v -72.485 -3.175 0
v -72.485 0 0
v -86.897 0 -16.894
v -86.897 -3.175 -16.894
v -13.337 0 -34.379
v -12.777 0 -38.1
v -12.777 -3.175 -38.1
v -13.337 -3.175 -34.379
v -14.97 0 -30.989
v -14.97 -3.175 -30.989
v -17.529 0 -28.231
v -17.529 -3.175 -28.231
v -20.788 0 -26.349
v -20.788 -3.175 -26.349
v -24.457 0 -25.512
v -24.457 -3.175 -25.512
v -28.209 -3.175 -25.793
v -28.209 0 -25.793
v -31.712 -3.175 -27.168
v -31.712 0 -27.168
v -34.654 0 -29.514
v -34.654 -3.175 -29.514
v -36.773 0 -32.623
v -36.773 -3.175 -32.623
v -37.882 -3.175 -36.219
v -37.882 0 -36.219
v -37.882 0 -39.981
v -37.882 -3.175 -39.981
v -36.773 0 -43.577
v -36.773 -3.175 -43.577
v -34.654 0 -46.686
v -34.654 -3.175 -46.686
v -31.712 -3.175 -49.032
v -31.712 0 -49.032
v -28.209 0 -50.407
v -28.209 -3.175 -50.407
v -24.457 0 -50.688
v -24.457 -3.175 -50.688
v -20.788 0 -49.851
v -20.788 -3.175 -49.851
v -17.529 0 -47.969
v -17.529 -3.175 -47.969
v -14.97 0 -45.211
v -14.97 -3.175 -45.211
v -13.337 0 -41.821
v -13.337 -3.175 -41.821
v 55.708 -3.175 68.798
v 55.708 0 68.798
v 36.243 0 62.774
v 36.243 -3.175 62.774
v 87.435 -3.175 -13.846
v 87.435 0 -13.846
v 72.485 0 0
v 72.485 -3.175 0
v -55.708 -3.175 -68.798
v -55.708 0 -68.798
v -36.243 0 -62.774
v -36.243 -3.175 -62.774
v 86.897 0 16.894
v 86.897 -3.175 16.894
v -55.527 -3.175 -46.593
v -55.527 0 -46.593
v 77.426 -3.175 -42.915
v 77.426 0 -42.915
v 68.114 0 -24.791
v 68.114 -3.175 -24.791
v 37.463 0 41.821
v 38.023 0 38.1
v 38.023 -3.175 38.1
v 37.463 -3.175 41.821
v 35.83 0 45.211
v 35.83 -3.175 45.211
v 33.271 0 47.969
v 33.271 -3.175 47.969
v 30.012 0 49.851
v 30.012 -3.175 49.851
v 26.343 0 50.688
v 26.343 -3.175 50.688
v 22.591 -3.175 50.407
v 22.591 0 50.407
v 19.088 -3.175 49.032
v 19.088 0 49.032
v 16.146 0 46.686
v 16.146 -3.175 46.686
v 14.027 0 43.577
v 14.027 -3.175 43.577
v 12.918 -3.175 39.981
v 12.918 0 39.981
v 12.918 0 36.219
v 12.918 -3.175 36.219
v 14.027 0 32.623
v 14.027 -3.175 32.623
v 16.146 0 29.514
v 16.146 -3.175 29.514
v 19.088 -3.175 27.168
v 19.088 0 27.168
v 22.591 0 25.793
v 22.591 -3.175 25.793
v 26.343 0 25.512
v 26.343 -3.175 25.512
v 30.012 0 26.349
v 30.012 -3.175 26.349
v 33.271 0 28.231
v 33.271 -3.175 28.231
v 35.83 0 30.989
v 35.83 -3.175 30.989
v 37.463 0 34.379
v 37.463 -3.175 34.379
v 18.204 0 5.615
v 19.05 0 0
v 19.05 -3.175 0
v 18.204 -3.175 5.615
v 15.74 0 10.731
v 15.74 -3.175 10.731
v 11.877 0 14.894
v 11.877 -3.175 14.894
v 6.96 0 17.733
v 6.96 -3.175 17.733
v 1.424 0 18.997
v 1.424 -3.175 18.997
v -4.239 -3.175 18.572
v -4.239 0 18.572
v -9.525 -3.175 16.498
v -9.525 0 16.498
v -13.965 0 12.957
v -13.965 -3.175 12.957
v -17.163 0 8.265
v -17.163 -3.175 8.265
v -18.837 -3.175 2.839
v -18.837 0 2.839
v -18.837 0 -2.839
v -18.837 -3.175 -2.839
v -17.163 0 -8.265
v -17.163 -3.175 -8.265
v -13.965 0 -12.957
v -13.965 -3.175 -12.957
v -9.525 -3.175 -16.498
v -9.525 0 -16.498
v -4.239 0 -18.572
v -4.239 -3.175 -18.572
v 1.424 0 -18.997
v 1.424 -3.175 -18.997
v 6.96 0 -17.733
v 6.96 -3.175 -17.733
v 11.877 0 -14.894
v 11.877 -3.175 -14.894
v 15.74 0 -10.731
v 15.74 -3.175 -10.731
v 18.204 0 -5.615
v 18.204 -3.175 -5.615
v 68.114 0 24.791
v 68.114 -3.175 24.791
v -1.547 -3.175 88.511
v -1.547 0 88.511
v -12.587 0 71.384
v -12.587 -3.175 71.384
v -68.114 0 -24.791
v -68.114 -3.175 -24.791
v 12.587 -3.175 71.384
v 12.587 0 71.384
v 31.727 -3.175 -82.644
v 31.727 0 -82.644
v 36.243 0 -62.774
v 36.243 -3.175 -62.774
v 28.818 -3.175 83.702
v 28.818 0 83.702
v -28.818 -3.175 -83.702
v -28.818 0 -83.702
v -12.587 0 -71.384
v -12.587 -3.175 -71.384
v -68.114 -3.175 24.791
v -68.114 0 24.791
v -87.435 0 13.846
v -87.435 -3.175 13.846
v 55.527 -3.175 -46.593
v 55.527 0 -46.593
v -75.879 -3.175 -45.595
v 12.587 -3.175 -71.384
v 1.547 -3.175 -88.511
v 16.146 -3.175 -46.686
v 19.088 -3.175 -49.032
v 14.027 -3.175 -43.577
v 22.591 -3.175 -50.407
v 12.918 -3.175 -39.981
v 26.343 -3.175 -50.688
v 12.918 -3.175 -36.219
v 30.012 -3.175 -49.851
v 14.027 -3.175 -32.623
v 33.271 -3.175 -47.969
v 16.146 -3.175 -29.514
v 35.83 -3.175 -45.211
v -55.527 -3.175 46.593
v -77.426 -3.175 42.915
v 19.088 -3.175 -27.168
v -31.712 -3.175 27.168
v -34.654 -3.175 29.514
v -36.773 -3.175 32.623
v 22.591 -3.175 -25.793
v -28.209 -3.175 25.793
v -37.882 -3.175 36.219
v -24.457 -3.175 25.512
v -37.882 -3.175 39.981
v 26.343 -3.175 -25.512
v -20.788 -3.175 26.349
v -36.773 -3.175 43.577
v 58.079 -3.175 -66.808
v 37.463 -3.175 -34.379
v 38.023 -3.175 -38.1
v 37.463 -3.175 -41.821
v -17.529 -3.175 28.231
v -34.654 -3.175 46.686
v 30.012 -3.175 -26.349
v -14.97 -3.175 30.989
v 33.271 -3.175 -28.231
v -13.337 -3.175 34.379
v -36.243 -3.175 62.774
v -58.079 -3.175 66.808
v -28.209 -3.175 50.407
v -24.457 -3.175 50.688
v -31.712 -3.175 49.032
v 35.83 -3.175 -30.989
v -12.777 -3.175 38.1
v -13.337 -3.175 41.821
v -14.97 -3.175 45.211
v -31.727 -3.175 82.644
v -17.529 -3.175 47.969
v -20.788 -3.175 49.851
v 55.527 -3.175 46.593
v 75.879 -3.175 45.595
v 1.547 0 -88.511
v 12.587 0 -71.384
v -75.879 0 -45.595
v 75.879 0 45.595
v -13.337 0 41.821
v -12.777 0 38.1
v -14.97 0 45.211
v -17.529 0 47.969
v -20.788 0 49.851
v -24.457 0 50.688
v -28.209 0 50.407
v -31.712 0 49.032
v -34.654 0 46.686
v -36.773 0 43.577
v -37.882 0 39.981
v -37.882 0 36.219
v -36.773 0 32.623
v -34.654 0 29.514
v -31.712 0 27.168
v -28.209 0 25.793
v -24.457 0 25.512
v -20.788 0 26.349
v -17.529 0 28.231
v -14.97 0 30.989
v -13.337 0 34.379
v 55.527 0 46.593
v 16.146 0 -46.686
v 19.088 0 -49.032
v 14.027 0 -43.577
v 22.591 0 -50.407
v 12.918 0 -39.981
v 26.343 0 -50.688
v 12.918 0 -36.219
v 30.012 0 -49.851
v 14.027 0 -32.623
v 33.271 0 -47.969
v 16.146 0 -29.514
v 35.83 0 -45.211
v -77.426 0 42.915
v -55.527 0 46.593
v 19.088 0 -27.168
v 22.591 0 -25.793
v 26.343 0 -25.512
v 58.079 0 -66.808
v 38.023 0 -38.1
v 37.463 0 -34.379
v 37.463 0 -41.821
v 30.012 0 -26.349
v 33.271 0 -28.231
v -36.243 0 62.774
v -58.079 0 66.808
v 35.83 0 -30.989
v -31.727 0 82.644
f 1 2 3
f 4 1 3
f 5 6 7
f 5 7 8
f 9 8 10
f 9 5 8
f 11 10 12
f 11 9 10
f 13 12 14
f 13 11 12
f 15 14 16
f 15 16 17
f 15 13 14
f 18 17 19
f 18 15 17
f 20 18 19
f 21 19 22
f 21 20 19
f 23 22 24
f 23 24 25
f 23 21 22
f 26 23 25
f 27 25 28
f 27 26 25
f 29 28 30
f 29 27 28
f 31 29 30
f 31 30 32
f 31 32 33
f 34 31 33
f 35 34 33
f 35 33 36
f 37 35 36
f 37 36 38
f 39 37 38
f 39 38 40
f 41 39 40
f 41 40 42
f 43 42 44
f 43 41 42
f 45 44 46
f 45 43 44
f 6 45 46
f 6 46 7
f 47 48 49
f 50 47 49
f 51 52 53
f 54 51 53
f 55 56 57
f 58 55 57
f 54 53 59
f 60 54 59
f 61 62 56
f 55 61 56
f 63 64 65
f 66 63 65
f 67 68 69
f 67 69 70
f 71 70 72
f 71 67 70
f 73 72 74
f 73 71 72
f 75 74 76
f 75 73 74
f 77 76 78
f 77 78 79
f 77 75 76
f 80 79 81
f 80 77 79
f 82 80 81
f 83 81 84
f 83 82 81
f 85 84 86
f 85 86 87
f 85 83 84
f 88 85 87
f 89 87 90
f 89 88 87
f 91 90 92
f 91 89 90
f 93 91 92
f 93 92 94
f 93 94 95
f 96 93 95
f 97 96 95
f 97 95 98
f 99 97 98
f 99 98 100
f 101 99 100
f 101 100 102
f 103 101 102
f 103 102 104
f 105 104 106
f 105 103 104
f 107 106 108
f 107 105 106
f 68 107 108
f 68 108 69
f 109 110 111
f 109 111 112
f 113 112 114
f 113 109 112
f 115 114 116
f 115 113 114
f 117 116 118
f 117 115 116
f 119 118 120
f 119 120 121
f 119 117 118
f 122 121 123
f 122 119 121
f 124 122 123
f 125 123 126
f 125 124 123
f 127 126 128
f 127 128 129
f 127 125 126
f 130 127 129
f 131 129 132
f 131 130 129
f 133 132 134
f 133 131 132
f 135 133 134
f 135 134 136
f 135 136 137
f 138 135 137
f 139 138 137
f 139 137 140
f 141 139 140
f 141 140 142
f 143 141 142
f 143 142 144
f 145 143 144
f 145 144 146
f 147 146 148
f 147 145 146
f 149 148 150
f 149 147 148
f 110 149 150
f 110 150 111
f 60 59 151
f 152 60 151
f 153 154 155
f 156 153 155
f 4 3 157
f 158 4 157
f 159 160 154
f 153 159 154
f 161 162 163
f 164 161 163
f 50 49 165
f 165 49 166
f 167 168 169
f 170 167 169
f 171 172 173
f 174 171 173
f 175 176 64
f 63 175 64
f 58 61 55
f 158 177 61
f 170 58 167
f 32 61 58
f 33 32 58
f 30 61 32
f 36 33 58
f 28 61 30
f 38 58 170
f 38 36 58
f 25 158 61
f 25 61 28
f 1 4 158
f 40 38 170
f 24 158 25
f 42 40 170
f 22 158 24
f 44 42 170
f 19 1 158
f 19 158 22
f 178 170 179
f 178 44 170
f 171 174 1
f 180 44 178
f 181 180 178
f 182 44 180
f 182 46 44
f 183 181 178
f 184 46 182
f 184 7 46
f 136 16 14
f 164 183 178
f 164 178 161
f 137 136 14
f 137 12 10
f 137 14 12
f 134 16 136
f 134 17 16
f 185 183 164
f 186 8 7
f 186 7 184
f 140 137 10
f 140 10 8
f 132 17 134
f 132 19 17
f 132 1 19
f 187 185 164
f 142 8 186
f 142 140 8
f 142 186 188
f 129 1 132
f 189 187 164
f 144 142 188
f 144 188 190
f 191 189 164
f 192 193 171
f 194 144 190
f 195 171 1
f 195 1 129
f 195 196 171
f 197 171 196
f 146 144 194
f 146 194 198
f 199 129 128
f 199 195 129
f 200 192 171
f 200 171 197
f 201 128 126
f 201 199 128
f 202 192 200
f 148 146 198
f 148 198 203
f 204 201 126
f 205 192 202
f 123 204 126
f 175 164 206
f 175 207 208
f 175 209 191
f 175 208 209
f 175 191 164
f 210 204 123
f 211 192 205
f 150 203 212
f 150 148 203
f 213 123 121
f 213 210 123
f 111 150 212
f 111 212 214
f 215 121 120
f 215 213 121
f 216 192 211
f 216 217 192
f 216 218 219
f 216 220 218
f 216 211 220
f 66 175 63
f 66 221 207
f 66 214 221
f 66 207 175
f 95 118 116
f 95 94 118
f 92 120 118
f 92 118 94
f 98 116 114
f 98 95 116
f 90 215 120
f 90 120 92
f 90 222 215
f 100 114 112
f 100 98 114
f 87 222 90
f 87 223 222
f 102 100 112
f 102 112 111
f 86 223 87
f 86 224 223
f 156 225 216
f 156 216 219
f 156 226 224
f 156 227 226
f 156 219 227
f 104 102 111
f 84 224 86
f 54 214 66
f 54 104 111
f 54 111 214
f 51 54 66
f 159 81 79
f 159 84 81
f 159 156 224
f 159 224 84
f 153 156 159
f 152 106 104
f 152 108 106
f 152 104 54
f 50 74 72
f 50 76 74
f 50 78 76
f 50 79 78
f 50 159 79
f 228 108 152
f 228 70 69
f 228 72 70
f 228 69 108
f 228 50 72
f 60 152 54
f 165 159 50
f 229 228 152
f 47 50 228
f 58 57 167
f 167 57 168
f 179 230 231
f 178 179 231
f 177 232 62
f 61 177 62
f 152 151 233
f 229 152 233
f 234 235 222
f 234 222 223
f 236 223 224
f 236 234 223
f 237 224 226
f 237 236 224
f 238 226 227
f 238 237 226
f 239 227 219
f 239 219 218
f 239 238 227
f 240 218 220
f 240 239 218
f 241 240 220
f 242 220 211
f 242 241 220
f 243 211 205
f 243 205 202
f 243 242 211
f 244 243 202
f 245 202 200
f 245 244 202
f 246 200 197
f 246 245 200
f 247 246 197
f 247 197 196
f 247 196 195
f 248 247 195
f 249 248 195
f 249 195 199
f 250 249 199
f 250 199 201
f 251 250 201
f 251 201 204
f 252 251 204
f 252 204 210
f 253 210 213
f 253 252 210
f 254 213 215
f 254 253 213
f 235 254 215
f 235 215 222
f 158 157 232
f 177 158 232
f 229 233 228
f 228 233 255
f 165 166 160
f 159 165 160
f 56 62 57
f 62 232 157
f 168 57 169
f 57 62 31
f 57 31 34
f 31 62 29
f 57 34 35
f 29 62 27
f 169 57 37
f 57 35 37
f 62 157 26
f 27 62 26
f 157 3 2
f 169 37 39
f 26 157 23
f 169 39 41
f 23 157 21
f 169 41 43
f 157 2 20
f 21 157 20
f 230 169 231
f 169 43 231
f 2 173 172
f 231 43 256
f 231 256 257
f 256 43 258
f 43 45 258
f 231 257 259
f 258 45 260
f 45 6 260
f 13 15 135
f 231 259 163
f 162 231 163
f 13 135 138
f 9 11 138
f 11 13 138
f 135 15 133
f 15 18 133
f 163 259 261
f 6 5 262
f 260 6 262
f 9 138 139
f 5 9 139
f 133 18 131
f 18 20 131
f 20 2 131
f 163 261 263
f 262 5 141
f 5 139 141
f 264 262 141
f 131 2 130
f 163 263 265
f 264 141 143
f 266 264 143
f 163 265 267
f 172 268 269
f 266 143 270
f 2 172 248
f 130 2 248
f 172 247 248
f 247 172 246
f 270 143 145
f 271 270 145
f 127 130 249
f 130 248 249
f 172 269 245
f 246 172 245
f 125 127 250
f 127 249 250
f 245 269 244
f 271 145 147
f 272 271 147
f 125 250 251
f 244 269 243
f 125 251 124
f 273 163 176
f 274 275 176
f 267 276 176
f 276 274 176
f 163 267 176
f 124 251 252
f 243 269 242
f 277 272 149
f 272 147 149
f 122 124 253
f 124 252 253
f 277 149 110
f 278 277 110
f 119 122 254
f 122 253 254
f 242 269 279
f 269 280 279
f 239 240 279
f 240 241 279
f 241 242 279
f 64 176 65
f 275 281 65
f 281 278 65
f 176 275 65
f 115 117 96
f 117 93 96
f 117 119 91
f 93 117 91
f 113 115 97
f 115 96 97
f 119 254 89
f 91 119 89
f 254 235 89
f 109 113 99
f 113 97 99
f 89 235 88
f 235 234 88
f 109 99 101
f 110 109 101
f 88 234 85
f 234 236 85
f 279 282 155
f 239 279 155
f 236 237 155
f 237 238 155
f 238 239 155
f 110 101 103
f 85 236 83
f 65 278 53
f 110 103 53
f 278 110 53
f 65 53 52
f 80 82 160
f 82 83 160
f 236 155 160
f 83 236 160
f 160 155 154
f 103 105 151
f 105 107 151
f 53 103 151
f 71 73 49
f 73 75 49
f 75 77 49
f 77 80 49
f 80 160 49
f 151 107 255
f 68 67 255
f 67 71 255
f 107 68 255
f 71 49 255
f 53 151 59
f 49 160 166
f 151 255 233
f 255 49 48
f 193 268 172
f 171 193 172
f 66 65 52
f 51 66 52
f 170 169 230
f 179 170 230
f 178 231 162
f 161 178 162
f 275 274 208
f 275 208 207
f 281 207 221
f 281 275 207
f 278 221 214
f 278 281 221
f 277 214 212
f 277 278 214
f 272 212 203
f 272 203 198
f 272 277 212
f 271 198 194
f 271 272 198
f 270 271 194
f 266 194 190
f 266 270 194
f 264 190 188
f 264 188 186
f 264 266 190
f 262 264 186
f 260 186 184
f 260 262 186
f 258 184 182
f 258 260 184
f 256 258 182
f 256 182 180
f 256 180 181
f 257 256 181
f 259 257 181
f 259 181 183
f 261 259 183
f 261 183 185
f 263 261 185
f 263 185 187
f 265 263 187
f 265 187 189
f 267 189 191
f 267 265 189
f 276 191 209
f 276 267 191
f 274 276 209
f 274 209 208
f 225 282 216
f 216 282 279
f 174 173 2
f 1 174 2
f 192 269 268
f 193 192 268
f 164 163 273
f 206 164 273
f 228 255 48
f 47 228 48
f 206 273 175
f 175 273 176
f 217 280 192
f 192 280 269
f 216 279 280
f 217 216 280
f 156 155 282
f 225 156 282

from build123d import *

# Parameters (mm, degrees)
F0_R     = 12.6233535656
F0_R_2   = 19.05
F1_DEPTH = 3.175


with BuildPart() as f1:
    # F0 (on Front) → F1 (new body)
    with BuildSketch(Plane.XZ):
        with BuildLine():
            ThreePointArc((68.11386007, -24.7914176064), (71.3840419736, -12.586932592), (72.485255884, 0))
            ThreePointArc((72.485255884, 0), (71.3840419736, 12.586932592), (68.11386007, 24.7914176064))
            ThreePointArc((68.11386007, 24.7914176064), (62.7740729954, 36.242627942), (55.526927478, 46.5926243672))
            ThreePointArc((55.526927478, 46.5926243672), (46.5926243672, 55.526927478), (36.242627942, 62.7740729954))
            ThreePointArc((36.242627942, 62.7740729954), (24.7914176064, 68.11386007), (12.586932592, 71.3840419736))
            ThreePointArc((12.586932592, 71.3840419736), (0, 72.485255884), (-12.586932592, 71.3840419736))
            ThreePointArc((-12.586932592, 71.3840419736), (-24.7914176064, 68.11386007), (-36.242627942, 62.7740729954))
            ThreePointArc((-36.242627942, 62.7740729954), (-46.5926243672, 55.526927478), (-55.526927478, 46.5926243672))
            ThreePointArc((-55.526927478, 46.5926243672), (-62.7740729954, 36.242627942), (-68.11386007, 24.7914176064))
            ThreePointArc((-68.11386007, 24.7914176064), (-71.3840419736, 12.586932592), (-72.485255884, 0))
            ThreePointArc((-72.485255884, 0), (-71.3840419736, -12.586932592), (-68.11386007, -24.7914176064))
            ThreePointArc((-68.11386007, -24.7914176064), (-62.7740729954, -36.242627942), (-55.526927478, -46.5926243672))
            ThreePointArc((-55.526927478, -46.5926243672), (-46.5926243672, -55.526927478), (-36.242627942, -62.7740729954))
            ThreePointArc((-36.242627942, -62.7740729954), (-24.7914176064, -68.11386007), (-12.586932592, -71.3840419736))
            ThreePointArc((-12.586932592, -71.3840419736), (0, -72.485255884), (12.586932592, -71.3840419736))
            ThreePointArc((12.586932592, -71.3840419736), (24.7914176064, -68.11386007), (36.242627942, -62.7740729954))
            ThreePointArc((36.242627942, -62.7740729954), (46.5926243672, -55.526927478), (55.526927478, -46.5926243672))
            ThreePointArc((55.526927478, -46.5926243672), (62.7740729954, -36.242627942), (68.11386007, -24.7914176064))
        make_face()
        with Locations((-25.4, -38.1)):
            Circle(F0_R, mode=Mode.SUBTRACT)
        with Locations((25.4, -38.1)):
            Circle(F0_R, mode=Mode.SUBTRACT)
        with Locations((-25.4, 38.1)):
            Circle(F0_R, mode=Mode.SUBTRACT)
        Circle(F0_R_2, mode=Mode.SUBTRACT)
        with Locations((25.4, 38.1)):
            Circle(F0_R, mode=Mode.SUBTRACT)
        with BuildLine():
            Line((87.4346938634, -13.8457773117), (72.485255884, 0))
            ThreePointArc((72.485255884, 0), (71.3840419736, -12.586932592), (68.11386007, -24.7914176064))
            Line((68.11386007, -24.7914176064), (87.4346938634, -13.8457773117))
        make_face()
        with BuildLine():
            ThreePointArc((68.11386007, 24.7914176064), (71.3840419736, 12.586932592), (72.485255884, 0))
            Line((72.485255884, 0), (86.8972713647, 16.893651758))
            Line((86.8972713647, 16.893651758), (68.11386007, 24.7914176064))
        make_face()
        with BuildLine():
            ThreePointArc((55.526927478, 46.5926243672), (62.7740729954, 36.242627942), (68.11386007, 24.7914176064))
            Line((68.11386007, 24.7914176064), (75.8787554723, 45.5954571019))
            Line((75.8787554723, 45.5954571019), (55.526927478, 46.5926243672))
        make_face()
        with BuildLine():
            Line((77.4262018835, -42.9152012956), (68.11386007, -24.7914176064))
            ThreePointArc((68.11386007, -24.7914176064), (62.7740729954, -36.242627942), (55.526927478, -46.5926243672))
            Line((55.526927478, -46.5926243672), (77.4262018835, -42.9152012956))
        make_face()
        with BuildLine():
            ThreePointArc((36.242627942, 62.7740729954), (46.5926243672, 55.526927478), (55.526927478, 46.5926243672))
            Line((55.526927478, 46.5926243672), (55.7081418188, 68.797777402))
            Line((55.7081418188, 68.797777402), (36.242627942, 62.7740729954))
        make_face()
        with BuildLine():
            Line((58.0789672675, -66.8084186424), (55.526927478, -46.5926243672))
            ThreePointArc((55.526927478, -46.5926243672), (46.5926243672, -55.526927478), (36.242627942, -62.7740729954))
            Line((36.242627942, -62.7740729954), (58.0789672675, -66.8084186424))
        make_face()
        with BuildLine():
            ThreePointArc((12.586932592, 71.3840419736), (24.7914176064, 68.11386007), (36.242627942, 62.7740729954))
            Line((36.242627942, 62.7740729954), (28.8183040973, 83.7020704004))
            Line((28.8183040973, 83.7020704004), (12.586932592, 71.3840419736))
        make_face()
        with BuildLine():
            Line((31.7265520446, -82.6435547137), (36.242627942, -62.7740729954))
            ThreePointArc((36.242627942, -62.7740729954), (24.7914176064, -68.11386007), (12.586932592, -71.3840419736))
            Line((12.586932592, -71.3840419736), (31.7265520446, -82.6435547137))
        make_face()
        with BuildLine():
            ThreePointArc((-12.586932592, 71.3840419736), (0, 72.485255884), (12.586932592, 71.3840419736))
            Line((12.586932592, 71.3840419736), (-1.5474464112, 88.5106583975))
            Line((-1.5474464112, 88.5106583975), (-12.586932592, 71.3840419736))
        make_face()
        with BuildLine():
            Line((1.5474464112, -88.5106583975), (12.586932592, -71.3840419736))
            ThreePointArc((12.586932592, -71.3840419736), (0, -72.485255884), (-12.586932592, -71.3840419736))
            Line((-12.586932592, -71.3840419736), (1.5474464112, -88.5106583975))
        make_face()
        with BuildLine():
            ThreePointArc((-36.242627942, 62.7740729954), (-24.7914176064, 68.11386007), (-12.586932592, 71.3840419736))
            Line((-12.586932592, 71.3840419736), (-31.7265520446, 82.6435547137))
            Line((-31.7265520446, 82.6435547137), (-36.242627942, 62.7740729954))
        make_face()
        with BuildLine():
            Line((-28.8183040973, -83.7020704004), (-12.586932592, -71.3840419736))
            ThreePointArc((-12.586932592, -71.3840419736), (-24.7914176064, -68.11386007), (-36.242627942, -62.7740729954))
            Line((-36.242627942, -62.7740729954), (-28.8183040973, -83.7020704004))
        make_face()
        with BuildLine():
            ThreePointArc((-55.526927478, 46.5926243672), (-46.5926243672, 55.526927478), (-36.242627942, 62.7740729954))
            Line((-36.242627942, 62.7740729954), (-58.0789672675, 66.8084186424))
            Line((-58.0789672675, 66.8084186424), (-55.526927478, 46.5926243672))
        make_face()
        with BuildLine():
            Line((-55.7081418188, -68.797777402), (-36.242627942, -62.7740729954))
            ThreePointArc((-36.242627942, -62.7740729954), (-46.5926243672, -55.526927478), (-55.526927478, -46.5926243672))
            Line((-55.526927478, -46.5926243672), (-55.7081418188, -68.797777402))
        make_face()
        with BuildLine():
            ThreePointArc((-68.11386007, 24.7914176064), (-62.7740729954, 36.242627942), (-55.526927478, 46.5926243672))
            Line((-55.526927478, 46.5926243672), (-77.4262018835, 42.9152012956))
            Line((-77.4262018835, 42.9152012956), (-68.11386007, 24.7914176064))
        make_face()
        with BuildLine():
            Line((-75.8787554723, -45.5954571019), (-55.526927478, -46.5926243672))
            ThreePointArc((-55.526927478, -46.5926243672), (-62.7740729954, -36.242627942), (-68.11386007, -24.7914176064))
            Line((-68.11386007, -24.7914176064), (-75.8787554723, -45.5954571019))
        make_face()
        with BuildLine():
            ThreePointArc((-72.485255884, 0), (-71.3840419736, 12.586932592), (-68.11386007, 24.7914176064))
            Line((-68.11386007, 24.7914176064), (-87.4346938634, 13.8457773117))
            Line((-87.4346938634, 13.8457773117), (-72.485255884, 0))
        make_face()
        with BuildLine():
            Line((-86.8972713647, -16.893651758), (-68.11386007, -24.7914176064))
            ThreePointArc((-68.11386007, -24.7914176064), (-71.3840419736, -12.586932592), (-72.485255884, 0))
            Line((-72.485255884, 0), (-86.8972713647, -16.893651758))
        make_face()
    extrude(amount=F1_DEPTH)


solid = f1.part
